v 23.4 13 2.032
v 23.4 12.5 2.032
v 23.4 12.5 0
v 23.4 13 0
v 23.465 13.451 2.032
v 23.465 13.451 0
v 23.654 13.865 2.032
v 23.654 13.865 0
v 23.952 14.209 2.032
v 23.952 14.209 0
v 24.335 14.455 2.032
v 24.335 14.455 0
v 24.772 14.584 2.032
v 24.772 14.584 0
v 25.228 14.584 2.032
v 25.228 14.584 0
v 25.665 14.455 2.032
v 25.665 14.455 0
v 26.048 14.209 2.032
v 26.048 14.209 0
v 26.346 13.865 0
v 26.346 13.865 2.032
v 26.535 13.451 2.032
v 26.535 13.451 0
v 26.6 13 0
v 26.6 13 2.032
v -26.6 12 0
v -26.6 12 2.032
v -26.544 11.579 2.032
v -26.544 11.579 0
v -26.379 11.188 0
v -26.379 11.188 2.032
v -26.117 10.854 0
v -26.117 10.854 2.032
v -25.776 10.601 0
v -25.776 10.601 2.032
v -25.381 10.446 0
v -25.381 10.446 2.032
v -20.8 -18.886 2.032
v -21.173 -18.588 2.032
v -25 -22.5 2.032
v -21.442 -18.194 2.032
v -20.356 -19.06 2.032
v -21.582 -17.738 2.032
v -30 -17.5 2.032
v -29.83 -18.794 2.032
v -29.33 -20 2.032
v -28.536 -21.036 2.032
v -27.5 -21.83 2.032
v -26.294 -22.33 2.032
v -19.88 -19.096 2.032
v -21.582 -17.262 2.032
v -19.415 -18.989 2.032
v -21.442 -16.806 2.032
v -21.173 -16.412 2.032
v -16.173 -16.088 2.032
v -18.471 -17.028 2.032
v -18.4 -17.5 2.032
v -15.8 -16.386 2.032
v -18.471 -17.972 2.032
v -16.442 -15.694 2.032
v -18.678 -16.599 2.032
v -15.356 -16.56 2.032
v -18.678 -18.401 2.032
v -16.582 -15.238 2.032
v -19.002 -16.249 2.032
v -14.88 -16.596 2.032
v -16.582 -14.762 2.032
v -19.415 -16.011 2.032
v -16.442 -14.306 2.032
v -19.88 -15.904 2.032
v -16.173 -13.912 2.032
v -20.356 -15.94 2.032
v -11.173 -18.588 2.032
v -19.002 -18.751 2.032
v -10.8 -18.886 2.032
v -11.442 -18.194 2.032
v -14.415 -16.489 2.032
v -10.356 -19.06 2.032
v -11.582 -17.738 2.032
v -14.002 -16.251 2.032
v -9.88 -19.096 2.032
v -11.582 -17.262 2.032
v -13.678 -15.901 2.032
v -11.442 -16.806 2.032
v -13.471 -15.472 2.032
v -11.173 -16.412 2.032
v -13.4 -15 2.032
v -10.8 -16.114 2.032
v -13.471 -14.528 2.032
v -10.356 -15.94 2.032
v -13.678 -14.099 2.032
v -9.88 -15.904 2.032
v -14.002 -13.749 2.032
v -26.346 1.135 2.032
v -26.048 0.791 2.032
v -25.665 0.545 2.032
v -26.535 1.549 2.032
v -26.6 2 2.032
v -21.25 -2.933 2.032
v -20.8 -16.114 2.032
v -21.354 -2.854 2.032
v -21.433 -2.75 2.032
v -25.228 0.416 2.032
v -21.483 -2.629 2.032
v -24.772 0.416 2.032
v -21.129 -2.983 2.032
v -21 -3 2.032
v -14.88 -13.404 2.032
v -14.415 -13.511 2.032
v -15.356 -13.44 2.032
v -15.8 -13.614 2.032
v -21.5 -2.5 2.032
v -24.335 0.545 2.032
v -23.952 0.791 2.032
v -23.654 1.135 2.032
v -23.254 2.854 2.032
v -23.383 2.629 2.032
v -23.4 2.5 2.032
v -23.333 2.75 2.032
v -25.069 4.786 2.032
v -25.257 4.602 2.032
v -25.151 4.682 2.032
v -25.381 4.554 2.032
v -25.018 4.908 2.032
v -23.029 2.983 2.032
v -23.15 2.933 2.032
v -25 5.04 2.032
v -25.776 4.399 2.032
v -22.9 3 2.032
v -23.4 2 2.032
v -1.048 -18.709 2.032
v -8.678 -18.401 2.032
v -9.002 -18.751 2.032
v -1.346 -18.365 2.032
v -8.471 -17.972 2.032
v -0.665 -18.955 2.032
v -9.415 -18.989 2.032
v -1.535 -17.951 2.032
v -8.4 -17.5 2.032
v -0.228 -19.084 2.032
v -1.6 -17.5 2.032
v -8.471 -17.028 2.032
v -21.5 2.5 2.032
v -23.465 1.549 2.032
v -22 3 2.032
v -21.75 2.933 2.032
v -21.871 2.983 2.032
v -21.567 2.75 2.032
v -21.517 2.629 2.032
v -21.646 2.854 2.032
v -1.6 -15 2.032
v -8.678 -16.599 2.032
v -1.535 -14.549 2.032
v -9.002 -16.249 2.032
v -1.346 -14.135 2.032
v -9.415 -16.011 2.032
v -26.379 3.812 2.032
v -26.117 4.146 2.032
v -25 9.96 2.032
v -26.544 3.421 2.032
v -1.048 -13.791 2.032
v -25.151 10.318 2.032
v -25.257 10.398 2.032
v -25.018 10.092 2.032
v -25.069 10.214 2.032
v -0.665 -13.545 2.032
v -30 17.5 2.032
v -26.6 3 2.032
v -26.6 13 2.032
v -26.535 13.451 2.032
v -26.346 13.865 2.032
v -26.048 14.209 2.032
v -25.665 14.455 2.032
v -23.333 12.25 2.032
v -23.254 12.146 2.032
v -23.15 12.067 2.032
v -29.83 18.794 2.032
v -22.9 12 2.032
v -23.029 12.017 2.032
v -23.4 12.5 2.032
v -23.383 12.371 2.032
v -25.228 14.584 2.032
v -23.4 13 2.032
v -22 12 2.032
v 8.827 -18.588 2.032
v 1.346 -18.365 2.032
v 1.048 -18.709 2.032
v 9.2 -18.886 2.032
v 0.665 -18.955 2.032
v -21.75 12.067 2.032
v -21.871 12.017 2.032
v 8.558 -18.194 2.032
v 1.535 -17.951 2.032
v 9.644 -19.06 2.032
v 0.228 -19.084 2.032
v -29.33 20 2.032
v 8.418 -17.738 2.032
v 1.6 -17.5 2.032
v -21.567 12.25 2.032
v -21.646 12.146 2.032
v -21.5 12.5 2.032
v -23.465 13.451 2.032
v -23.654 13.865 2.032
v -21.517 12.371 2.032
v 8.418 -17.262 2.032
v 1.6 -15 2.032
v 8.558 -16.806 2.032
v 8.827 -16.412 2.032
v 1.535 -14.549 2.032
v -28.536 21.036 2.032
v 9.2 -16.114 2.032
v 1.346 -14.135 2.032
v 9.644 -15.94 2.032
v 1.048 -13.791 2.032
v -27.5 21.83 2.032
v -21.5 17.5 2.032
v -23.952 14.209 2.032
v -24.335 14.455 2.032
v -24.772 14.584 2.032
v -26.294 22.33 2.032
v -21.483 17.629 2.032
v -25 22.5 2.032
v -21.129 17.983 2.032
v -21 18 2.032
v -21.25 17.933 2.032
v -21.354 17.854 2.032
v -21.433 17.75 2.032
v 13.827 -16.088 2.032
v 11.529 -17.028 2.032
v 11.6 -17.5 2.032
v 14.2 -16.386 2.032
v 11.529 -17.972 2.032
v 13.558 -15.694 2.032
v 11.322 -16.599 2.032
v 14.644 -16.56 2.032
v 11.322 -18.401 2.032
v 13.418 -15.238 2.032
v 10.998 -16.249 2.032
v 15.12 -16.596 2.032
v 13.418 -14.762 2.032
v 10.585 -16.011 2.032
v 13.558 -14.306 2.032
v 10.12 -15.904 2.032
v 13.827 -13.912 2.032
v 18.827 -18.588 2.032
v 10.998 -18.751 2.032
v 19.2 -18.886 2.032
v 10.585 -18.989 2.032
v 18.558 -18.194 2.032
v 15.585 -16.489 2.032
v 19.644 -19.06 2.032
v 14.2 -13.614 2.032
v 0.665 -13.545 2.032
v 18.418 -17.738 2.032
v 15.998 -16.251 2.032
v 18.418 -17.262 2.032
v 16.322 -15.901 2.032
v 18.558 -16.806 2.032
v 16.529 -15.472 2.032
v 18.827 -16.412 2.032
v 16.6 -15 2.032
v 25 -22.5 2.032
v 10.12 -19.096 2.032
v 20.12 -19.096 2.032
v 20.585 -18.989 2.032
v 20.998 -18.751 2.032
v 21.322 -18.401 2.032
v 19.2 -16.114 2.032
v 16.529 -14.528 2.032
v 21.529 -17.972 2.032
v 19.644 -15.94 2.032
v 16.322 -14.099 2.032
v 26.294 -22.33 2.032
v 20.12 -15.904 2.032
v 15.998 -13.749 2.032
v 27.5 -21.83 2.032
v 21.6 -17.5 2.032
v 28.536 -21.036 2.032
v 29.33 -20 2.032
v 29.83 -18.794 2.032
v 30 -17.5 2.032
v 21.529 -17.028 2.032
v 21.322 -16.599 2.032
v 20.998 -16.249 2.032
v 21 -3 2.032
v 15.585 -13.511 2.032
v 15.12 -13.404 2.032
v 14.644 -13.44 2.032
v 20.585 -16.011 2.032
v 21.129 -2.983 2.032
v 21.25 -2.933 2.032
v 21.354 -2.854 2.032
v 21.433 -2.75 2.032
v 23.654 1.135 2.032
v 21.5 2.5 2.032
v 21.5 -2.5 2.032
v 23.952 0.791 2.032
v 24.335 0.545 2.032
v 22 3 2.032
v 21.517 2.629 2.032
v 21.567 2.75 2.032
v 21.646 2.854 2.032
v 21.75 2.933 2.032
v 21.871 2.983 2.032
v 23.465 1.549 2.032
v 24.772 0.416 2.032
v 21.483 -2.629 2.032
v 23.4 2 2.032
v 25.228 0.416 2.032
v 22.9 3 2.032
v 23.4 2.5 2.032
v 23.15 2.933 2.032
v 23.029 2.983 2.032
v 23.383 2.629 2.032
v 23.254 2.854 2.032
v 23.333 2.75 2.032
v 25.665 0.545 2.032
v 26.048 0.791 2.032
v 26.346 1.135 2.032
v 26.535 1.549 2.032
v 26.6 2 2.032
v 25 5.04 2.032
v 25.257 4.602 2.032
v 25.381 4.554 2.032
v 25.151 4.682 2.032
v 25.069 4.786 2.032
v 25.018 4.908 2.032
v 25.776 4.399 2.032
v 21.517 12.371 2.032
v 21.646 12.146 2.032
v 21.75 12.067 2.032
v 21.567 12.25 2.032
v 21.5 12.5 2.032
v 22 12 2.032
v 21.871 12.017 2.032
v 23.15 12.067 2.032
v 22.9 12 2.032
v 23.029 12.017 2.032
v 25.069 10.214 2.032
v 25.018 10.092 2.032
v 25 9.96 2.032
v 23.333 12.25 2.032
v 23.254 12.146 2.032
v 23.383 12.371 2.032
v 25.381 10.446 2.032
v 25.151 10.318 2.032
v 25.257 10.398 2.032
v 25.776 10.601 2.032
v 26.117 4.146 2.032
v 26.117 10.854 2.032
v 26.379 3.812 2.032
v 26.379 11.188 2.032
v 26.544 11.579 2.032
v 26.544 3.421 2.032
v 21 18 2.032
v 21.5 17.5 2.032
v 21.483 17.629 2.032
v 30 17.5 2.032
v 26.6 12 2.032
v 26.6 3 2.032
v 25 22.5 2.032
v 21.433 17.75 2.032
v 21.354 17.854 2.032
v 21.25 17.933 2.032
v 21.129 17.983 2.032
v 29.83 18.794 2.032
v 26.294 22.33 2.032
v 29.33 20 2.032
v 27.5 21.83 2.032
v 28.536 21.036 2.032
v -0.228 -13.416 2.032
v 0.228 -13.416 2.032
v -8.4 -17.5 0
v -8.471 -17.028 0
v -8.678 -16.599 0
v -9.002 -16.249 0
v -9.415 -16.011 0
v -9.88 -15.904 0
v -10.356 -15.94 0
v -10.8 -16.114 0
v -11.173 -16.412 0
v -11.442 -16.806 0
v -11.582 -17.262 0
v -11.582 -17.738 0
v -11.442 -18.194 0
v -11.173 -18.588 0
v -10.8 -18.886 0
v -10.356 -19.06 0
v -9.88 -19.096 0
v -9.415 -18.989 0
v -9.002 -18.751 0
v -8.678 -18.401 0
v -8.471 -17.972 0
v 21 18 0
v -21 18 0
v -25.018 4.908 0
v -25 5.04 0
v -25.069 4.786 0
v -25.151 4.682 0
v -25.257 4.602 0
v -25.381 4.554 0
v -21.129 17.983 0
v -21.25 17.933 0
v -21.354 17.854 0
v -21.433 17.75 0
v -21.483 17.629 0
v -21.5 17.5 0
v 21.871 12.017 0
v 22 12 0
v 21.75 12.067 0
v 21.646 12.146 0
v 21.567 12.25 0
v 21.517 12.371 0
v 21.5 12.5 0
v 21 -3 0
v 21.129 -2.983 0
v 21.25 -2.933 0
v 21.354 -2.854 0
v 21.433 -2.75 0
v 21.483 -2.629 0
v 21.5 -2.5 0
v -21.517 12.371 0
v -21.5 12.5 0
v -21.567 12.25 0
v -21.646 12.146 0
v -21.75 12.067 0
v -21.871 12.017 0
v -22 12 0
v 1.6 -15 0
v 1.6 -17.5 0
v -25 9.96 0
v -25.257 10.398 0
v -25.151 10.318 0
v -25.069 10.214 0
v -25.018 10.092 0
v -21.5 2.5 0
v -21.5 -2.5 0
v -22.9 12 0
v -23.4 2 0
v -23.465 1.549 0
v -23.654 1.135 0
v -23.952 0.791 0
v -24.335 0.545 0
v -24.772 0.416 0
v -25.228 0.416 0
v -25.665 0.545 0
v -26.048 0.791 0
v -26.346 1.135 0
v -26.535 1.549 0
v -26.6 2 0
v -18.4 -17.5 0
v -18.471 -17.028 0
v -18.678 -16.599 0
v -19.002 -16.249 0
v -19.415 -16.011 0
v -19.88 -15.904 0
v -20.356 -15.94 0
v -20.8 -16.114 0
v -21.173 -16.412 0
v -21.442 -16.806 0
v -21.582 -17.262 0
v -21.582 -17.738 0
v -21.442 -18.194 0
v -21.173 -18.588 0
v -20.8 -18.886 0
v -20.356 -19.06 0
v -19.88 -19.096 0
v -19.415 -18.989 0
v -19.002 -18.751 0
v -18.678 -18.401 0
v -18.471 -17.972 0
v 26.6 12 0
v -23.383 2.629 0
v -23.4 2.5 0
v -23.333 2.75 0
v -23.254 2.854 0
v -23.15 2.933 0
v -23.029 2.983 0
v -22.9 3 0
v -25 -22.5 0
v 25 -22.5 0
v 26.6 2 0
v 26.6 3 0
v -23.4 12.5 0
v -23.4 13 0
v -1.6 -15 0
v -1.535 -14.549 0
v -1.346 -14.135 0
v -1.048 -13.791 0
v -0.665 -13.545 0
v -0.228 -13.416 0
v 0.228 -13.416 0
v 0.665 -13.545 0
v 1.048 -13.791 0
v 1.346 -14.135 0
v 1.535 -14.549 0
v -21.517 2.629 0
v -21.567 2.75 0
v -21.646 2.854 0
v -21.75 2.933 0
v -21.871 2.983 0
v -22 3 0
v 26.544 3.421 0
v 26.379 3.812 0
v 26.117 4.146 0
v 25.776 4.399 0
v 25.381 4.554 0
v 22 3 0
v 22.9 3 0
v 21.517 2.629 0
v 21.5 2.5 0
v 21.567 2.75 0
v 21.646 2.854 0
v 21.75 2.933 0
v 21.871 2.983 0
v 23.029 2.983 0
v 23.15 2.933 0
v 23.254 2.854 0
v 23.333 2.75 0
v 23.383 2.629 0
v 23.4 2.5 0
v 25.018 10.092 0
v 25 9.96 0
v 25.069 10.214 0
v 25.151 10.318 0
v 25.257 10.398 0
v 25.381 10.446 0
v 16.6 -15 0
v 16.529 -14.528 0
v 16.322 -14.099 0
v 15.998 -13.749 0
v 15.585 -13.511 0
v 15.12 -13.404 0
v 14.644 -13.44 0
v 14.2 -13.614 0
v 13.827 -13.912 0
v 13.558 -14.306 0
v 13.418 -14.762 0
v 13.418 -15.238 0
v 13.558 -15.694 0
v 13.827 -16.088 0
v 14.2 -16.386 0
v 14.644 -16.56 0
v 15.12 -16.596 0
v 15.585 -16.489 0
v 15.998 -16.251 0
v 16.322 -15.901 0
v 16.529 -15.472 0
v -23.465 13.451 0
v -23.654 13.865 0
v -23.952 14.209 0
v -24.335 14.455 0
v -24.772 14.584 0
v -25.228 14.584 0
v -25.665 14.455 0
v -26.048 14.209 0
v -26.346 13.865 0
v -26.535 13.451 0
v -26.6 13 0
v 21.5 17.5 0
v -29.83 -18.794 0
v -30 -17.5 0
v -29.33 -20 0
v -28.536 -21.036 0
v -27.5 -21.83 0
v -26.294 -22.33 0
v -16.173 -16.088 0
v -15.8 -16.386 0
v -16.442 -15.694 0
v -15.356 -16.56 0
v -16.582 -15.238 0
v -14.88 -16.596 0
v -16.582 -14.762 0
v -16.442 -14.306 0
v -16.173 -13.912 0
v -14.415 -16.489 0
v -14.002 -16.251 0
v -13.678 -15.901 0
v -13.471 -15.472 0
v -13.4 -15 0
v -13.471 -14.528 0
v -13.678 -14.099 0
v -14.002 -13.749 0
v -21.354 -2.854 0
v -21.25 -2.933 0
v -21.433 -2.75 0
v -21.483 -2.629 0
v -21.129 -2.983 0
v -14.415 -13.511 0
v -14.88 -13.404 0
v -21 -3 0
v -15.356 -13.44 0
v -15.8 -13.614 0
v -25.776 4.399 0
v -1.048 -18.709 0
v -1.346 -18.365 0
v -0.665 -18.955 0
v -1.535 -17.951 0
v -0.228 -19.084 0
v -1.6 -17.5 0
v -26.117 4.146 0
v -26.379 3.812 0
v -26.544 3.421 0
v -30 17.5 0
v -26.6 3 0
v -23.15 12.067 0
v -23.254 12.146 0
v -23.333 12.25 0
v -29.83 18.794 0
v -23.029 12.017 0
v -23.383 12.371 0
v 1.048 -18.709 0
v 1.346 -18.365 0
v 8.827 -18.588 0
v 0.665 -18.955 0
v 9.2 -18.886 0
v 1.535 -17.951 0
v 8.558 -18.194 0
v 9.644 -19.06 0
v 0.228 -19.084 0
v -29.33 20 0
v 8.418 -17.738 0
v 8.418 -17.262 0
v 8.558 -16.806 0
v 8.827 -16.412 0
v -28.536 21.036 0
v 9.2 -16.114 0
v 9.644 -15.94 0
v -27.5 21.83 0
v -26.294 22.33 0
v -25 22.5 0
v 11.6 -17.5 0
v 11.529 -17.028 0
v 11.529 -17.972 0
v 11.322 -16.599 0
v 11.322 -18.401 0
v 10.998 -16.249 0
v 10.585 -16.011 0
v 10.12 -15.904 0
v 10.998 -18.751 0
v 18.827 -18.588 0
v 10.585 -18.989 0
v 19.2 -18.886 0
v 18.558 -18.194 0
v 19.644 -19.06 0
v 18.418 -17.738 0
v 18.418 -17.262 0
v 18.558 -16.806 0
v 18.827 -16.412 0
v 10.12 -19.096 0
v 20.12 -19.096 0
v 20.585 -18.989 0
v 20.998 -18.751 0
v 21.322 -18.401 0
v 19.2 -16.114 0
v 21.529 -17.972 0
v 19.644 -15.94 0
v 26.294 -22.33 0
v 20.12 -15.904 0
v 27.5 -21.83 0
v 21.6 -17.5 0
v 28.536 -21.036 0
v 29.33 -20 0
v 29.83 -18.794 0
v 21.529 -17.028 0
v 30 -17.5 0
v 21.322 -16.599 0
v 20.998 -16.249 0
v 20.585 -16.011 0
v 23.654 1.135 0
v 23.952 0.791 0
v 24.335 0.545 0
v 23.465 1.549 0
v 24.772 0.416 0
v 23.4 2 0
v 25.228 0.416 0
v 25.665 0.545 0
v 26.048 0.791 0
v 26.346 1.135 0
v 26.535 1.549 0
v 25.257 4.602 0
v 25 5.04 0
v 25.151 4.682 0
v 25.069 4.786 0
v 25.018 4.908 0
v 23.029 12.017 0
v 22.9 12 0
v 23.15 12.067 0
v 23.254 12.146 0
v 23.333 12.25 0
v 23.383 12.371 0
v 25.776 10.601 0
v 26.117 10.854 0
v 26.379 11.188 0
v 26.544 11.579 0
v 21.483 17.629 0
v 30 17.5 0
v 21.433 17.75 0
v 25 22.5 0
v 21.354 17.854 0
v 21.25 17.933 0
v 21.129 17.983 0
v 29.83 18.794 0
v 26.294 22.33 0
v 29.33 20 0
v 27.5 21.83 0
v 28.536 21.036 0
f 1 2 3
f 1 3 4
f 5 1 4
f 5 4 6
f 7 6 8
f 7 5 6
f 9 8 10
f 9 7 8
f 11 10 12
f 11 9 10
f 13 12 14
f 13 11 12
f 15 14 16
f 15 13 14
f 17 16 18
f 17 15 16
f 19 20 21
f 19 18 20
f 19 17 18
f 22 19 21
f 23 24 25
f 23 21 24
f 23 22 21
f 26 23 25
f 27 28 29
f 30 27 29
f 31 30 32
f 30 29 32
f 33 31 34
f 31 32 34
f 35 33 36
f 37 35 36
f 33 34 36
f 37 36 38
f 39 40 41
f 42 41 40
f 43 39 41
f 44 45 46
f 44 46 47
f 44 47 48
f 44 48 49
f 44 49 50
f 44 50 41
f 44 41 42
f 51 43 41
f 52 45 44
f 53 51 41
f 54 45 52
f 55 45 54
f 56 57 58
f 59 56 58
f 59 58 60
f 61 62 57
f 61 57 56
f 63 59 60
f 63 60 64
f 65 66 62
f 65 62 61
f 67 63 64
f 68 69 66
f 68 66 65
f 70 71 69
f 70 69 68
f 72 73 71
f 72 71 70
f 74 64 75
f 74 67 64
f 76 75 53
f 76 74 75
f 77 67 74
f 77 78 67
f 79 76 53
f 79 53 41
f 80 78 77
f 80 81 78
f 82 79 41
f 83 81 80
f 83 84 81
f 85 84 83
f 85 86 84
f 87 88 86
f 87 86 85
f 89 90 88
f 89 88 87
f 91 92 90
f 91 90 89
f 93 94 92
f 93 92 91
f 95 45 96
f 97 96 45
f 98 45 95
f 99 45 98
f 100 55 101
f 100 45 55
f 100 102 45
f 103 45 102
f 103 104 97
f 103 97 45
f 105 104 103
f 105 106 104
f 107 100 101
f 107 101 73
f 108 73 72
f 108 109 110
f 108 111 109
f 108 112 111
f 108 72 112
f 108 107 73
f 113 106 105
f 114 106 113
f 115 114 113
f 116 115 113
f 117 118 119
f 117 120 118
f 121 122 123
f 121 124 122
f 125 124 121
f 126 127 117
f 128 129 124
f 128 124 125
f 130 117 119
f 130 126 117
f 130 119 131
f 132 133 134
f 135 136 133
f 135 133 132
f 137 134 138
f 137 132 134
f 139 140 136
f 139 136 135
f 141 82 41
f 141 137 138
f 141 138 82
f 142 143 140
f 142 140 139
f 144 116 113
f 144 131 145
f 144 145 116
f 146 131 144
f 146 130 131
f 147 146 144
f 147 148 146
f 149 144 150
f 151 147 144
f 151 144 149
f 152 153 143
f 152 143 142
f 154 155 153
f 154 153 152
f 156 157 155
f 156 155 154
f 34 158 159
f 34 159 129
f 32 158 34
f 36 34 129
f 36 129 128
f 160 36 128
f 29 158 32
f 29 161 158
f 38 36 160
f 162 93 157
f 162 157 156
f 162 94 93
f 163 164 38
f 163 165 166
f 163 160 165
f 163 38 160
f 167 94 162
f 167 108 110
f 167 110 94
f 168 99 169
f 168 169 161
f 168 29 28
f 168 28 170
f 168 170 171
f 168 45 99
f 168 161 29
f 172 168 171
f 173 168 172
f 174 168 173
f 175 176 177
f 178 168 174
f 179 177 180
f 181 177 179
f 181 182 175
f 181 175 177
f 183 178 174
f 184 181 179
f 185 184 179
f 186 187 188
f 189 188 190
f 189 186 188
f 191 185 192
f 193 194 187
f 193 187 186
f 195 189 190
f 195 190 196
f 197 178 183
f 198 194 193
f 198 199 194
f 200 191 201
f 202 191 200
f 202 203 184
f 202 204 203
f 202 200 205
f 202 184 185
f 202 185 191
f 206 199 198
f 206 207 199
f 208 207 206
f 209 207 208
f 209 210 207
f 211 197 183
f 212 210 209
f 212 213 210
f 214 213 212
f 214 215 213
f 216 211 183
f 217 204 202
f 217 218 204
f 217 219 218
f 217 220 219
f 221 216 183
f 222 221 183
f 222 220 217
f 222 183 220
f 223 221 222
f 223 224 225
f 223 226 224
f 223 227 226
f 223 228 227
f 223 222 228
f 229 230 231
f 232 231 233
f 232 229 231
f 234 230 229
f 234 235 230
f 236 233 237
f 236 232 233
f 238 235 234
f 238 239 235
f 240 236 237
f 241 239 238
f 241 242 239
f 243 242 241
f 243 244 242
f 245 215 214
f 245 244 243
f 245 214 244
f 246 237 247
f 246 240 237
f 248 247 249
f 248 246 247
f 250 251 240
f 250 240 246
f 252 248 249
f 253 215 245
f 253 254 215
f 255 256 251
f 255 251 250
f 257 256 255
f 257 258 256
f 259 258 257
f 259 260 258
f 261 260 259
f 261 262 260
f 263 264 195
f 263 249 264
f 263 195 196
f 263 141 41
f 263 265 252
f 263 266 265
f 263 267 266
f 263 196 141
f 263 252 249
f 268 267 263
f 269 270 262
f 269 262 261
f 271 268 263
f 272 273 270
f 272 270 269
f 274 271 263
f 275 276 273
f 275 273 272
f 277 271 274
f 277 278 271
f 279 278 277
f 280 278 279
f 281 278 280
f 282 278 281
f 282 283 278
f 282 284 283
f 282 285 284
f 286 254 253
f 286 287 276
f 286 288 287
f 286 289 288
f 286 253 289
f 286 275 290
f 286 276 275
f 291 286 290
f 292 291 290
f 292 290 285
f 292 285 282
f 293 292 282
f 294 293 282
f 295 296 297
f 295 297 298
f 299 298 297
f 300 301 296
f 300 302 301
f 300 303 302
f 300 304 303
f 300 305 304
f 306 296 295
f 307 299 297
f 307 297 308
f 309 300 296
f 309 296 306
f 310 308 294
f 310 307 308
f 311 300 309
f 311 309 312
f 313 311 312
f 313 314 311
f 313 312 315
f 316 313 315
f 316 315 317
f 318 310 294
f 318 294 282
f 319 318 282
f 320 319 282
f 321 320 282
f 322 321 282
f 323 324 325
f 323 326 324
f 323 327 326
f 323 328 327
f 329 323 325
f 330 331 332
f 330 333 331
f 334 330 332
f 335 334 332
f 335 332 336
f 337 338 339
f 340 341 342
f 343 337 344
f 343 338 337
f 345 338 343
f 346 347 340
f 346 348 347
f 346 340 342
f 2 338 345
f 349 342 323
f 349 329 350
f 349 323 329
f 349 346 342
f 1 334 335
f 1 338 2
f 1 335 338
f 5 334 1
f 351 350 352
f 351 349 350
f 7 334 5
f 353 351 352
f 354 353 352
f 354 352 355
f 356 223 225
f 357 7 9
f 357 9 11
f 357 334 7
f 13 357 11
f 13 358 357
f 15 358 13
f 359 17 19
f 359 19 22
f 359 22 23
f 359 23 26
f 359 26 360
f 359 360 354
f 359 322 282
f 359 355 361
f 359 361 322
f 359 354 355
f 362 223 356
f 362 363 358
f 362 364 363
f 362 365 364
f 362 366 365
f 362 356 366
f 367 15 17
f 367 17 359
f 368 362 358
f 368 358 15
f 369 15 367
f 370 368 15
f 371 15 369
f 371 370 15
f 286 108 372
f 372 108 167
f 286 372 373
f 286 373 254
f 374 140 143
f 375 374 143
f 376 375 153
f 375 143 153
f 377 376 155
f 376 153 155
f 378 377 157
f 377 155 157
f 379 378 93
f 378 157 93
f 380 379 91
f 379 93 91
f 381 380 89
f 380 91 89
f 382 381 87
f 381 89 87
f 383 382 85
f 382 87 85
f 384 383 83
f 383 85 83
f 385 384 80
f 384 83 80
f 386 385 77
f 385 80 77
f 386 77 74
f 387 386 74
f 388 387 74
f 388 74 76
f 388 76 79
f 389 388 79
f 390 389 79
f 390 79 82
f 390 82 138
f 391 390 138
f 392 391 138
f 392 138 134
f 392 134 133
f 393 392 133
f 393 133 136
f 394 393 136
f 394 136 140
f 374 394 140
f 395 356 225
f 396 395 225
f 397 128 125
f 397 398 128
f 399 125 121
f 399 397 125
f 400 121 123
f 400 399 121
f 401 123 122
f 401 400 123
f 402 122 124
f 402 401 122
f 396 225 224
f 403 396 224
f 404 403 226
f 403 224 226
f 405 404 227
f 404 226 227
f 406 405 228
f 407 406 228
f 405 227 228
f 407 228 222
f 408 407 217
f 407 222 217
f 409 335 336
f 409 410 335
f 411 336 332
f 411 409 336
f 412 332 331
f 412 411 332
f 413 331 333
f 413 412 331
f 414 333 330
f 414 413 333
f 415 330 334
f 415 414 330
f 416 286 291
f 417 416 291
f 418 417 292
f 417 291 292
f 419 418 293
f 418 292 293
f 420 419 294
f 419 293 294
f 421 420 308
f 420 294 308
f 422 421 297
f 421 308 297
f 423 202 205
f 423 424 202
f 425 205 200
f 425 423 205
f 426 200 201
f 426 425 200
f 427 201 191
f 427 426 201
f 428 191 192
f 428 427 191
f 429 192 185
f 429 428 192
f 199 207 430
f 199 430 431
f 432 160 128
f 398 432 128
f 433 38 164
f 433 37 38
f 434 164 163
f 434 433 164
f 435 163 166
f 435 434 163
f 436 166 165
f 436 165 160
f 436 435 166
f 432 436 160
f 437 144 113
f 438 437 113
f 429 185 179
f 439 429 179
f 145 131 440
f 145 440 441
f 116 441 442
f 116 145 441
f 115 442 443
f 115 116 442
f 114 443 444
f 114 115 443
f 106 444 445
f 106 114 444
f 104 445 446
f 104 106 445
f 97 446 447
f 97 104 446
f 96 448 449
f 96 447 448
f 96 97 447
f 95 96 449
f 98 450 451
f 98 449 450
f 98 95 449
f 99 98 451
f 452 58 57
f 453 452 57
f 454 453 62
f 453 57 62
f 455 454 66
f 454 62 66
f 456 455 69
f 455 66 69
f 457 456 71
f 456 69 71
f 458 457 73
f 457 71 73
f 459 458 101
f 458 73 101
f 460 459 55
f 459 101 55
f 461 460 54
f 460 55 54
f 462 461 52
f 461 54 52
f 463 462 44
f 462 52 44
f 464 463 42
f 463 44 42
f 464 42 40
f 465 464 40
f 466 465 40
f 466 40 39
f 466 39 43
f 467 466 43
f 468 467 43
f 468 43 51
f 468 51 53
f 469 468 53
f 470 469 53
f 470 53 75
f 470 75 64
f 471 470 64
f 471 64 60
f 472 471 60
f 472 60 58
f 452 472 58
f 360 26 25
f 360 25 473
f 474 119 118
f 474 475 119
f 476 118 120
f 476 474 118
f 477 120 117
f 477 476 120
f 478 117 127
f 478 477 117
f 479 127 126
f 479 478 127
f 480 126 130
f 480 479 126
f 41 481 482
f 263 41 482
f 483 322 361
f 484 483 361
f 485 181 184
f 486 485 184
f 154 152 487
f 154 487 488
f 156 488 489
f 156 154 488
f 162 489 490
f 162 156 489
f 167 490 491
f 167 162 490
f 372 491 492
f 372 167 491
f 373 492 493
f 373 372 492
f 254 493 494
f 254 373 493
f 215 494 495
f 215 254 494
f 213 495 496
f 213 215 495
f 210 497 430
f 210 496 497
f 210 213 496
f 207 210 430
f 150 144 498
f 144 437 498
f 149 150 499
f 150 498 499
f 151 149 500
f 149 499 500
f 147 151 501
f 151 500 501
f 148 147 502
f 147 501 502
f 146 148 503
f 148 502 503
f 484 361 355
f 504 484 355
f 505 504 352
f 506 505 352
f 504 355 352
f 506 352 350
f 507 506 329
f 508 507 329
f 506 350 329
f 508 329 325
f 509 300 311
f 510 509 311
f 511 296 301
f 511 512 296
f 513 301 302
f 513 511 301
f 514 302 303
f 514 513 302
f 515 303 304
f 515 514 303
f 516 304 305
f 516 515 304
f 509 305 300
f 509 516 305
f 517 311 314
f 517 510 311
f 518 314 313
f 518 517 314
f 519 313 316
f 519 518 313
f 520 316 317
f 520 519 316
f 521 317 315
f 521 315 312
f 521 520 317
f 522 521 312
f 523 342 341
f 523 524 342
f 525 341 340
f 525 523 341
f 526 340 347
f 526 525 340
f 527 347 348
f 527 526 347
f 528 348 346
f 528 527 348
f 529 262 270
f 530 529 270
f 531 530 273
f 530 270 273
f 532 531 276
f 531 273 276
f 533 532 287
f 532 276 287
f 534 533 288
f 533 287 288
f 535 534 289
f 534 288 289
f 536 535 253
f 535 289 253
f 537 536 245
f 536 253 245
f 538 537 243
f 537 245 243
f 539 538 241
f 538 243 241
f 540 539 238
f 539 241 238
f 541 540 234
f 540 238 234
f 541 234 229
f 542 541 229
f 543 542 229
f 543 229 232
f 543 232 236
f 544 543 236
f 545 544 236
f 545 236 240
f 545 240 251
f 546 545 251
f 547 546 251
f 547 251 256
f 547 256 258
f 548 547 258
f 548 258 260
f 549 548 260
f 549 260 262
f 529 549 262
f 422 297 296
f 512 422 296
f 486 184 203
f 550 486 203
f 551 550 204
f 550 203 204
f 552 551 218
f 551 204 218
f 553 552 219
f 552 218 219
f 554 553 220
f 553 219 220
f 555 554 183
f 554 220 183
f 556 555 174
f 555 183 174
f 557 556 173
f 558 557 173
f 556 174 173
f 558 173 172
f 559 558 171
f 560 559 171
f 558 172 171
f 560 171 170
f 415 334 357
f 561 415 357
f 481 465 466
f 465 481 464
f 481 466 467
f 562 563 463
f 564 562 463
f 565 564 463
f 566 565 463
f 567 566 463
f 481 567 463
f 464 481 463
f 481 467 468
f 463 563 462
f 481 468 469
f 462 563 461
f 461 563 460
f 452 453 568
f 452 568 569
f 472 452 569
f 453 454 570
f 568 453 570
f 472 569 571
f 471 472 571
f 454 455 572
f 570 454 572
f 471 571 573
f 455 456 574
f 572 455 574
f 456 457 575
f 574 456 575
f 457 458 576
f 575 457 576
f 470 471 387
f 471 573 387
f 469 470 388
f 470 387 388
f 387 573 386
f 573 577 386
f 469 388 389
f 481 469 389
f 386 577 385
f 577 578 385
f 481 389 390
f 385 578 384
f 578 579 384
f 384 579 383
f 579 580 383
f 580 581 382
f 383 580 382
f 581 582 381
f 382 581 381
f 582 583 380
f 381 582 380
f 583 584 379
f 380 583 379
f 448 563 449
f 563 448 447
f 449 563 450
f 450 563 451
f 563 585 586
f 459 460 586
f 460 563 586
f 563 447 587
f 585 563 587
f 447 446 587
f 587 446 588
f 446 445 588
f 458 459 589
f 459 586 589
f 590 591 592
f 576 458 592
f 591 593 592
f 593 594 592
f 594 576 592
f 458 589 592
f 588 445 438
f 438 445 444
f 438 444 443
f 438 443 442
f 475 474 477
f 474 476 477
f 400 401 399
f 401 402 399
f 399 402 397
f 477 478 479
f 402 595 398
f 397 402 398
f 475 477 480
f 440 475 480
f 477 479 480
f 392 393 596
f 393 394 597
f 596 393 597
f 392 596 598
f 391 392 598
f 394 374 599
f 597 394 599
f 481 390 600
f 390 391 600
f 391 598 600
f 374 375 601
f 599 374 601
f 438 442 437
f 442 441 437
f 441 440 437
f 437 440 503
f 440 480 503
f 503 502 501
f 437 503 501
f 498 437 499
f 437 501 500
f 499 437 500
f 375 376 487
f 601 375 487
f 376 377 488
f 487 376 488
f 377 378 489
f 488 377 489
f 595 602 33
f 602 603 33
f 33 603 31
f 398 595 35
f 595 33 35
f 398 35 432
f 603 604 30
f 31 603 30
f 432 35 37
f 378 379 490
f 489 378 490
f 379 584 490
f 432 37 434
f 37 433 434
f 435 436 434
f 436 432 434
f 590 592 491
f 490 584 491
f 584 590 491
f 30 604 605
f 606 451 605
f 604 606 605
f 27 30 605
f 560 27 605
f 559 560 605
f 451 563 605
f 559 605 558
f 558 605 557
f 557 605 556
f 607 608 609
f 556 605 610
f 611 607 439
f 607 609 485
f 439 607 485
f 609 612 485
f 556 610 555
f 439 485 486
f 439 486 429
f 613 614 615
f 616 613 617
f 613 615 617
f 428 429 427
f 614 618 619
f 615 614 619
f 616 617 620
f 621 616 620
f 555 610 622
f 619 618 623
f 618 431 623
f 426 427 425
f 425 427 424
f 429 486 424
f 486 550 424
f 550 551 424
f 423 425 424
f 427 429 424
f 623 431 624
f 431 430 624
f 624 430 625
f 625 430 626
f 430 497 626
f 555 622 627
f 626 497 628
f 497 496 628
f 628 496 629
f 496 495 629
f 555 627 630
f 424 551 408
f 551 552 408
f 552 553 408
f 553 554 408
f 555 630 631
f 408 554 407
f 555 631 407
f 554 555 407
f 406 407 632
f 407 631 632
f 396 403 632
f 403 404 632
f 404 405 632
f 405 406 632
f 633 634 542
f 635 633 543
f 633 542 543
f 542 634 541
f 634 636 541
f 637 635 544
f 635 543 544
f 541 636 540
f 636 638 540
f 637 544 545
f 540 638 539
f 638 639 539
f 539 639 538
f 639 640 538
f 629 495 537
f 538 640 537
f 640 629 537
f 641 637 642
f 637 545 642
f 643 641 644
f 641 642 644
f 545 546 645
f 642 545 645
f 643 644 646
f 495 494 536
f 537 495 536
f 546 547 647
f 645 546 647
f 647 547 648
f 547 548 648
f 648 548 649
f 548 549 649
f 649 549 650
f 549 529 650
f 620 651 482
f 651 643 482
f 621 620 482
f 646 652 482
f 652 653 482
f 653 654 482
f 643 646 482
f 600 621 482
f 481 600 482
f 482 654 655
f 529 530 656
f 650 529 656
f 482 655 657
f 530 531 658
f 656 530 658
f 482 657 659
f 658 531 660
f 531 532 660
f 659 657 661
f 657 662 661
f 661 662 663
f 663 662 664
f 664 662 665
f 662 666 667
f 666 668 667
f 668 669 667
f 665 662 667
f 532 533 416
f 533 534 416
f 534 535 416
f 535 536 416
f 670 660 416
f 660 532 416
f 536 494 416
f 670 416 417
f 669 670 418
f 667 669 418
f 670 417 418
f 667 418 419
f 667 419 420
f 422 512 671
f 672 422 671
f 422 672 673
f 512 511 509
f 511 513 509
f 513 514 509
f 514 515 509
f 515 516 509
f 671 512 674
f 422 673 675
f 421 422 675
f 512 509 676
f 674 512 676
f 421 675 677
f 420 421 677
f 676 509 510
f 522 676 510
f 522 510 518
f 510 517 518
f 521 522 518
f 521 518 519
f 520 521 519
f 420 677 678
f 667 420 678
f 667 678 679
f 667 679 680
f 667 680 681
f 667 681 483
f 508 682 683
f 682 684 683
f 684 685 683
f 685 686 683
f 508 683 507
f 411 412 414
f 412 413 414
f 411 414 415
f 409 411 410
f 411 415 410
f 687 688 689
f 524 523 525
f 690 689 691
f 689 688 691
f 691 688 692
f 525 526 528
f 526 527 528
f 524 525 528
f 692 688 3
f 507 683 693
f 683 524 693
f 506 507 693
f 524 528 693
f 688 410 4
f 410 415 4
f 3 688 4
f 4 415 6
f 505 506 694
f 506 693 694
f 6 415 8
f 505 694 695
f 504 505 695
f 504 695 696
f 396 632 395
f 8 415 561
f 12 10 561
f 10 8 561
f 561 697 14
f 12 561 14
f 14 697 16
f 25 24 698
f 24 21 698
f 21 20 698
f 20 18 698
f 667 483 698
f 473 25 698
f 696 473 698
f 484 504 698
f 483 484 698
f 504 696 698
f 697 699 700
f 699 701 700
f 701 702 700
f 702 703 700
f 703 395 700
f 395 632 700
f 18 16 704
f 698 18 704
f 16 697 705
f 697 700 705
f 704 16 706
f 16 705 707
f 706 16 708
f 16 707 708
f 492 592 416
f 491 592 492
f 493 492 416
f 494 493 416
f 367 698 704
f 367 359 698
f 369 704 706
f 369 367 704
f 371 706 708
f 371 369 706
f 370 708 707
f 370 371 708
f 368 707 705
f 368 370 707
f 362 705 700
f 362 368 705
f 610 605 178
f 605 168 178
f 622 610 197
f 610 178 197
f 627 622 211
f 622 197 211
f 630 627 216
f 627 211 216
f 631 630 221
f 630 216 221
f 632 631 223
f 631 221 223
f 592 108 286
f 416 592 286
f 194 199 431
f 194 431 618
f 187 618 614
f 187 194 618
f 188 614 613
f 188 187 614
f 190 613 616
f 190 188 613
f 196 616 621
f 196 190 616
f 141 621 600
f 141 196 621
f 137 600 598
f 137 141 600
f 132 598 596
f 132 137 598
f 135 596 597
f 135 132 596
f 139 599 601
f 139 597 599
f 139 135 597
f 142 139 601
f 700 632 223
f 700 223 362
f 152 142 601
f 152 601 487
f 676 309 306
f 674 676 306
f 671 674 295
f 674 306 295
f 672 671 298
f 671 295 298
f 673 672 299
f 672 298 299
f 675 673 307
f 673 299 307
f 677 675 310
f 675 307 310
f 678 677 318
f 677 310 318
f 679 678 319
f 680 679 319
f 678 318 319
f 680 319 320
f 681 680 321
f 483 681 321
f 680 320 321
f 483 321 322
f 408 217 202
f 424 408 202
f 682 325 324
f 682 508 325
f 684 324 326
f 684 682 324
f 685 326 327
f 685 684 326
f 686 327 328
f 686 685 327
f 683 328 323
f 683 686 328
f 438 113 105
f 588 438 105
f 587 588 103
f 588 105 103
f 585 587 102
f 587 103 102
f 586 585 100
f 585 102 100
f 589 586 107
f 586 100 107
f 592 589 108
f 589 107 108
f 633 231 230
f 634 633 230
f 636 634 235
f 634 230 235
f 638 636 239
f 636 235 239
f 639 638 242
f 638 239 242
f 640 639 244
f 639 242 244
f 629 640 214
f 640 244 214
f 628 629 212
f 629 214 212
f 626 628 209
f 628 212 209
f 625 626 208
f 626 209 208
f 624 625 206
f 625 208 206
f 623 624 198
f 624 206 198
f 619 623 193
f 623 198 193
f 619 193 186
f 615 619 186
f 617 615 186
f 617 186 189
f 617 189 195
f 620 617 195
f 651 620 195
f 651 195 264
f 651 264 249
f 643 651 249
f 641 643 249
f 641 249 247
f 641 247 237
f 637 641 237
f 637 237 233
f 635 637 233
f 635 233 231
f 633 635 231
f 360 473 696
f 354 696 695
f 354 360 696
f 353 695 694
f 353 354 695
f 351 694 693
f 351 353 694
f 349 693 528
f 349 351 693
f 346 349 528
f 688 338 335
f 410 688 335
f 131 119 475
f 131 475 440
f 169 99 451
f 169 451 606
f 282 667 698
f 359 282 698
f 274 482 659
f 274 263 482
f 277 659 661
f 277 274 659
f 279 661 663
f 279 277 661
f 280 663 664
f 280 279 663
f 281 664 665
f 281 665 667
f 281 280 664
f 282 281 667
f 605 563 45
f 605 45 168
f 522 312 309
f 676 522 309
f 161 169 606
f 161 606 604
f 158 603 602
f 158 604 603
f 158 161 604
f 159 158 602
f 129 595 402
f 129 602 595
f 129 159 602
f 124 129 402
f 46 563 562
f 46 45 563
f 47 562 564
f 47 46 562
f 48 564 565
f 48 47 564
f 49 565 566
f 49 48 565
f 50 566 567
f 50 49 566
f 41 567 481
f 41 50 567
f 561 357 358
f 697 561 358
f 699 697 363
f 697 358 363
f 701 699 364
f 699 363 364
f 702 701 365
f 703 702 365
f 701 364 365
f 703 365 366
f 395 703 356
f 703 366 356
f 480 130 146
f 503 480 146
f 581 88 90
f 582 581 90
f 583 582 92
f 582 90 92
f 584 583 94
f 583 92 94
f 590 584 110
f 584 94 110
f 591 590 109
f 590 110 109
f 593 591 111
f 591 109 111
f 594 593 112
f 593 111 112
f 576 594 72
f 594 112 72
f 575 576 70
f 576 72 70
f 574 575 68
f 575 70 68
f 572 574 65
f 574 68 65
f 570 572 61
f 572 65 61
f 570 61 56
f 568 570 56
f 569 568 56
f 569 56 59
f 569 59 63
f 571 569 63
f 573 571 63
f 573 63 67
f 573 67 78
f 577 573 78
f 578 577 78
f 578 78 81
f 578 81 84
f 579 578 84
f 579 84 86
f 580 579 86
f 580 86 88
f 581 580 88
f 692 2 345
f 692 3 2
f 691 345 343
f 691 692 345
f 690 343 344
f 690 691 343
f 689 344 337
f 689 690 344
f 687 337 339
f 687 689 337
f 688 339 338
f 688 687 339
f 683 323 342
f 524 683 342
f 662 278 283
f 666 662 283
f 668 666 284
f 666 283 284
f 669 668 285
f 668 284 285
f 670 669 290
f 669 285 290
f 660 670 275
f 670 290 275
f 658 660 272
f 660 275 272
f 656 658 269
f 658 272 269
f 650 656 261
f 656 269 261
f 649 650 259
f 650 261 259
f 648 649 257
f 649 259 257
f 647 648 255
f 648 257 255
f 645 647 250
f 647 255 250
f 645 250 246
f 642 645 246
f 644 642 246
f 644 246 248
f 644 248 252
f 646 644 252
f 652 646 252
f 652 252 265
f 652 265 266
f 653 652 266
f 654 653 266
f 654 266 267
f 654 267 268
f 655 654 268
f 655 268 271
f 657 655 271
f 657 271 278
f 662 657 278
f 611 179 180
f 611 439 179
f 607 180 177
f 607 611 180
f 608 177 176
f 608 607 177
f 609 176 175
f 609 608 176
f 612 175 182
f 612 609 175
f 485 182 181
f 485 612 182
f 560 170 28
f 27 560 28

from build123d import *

# Parameters (mm, degrees)
SKETCH1_W           = 60
SKETCH1_H           = 45
BOSS_EXTRUDE1_DEPTH = 2.032
FILLET1_R           = 5
SKETCH2_W           = 41
SKETCH2_H           = 21
CUT_EXTRUDE1_DEPTH  = 3.032
FILLET2_R           = 0.5
CUT_EXTRUDE2_DEPTH  = 3.032
SKETCH4_R           = 1.6
CUT_EXTRUDE3_DEPTH  = 3.032
CUT_EXTRUDE4_DEPTH  = 3.032
FILLET3_R           = 0.5


with BuildPart() as part:
    # Sketch1 → Boss-Extrude1 (new body)
    with BuildSketch(Plane.XY):
        Rectangle(SKETCH1_W, SKETCH1_H)
    extrude(amount=BOSS_EXTRUDE1_DEPTH)

    # Fillet1
    fillet1_edges = [part.edges().sort_by_distance(p)[0] for p in [
        (30, -22.5, 1.016),
        (-30, -22.5, 1.016),
        (-30, 22.5, 1.016),
        (30, 22.5, 1.016),
    ]]
    fillet(fillet1_edges, radius=FILLET1_R)

    # Sketch2 → Cut-Extrude1 (cut, through all)
    with BuildSketch(Plane.XY.offset(2.032)):
        with Locations((0, 7.5)):
            Rectangle(SKETCH2_W, SKETCH2_H)
    extrude(amount=-CUT_EXTRUDE1_DEPTH, mode=Mode.SUBTRACT)

    # Fillet2
    fillet2_edges = [part.edges().sort_by_distance(p)[0] for p in [
        (20.5, 18, 1.016),
        (20.5, -3, 1.016),
        (-20.5, -3, 1.016),
        (-20.5, 18, 1.016),
    ]]
    fillet(fillet2_edges, radius=FILLET2_R)

    # Sketch3 → Cut-Extrude2 (cut, through all)
    with BuildSketch(Plane.XY.offset(2.032)):
        with BuildLine():
            Line((-23.4, 3), (-23.4, 2))
            ThreePointArc((-23.4, 2), (-25, 0.4), (-26.6, 2))
            Line((-26.6, 2), (-26.6, 3))
            ThreePointArc((-26.6, 3), (-25, 4.6), (-23.4, 3))
        make_face()
        with BuildLine():
            Line((-23.4, 12), (-23.4, 13))
            ThreePointArc((-23.4, 13), (-25, 14.6), (-26.6, 13))
            Line((-26.6, 13), (-26.6, 12))
            ThreePointArc((-26.6, 12), (-25, 10.4), (-23.4, 12))
        make_face()
        with BuildLine():
            Line((23.4, 3), (23.4, 2))
            ThreePointArc((23.4, 2), (25, 0.4), (26.6, 2))
            Line((26.6, 2), (26.6, 3))
            ThreePointArc((26.6, 3), (25, 4.6), (23.4, 3))
        make_face()
        with BuildLine():
            Line((23.4, 12), (23.4, 13))
            ThreePointArc((23.4, 13), (25, 14.6), (26.6, 13))
            Line((26.6, 13), (26.6, 12))
            ThreePointArc((26.6, 12), (25, 10.4), (23.4, 12))
        make_face()
    extrude(amount=-CUT_EXTRUDE2_DEPTH, mode=Mode.SUBTRACT)

    # Sketch4 → Cut-Extrude3 (cut, through all)
    with BuildSketch(Plane.XY.offset(2.032)):
        with Locations((-15, -15)):
            Circle(SKETCH4_R)
        with Locations((15, -15)):
            Circle(SKETCH4_R)
        with Locations((10, -17.5)):
            Circle(SKETCH4_R)
        with Locations((-10, -17.5)):
            Circle(SKETCH4_R)
        with Locations((20, -17.5)):
            Circle(SKETCH4_R)
        with Locations((-20, -17.5)):
            Circle(SKETCH4_R)
        with BuildLine():
            Line((1.6, -15), (1.6, -17.5))
            ThreePointArc((1.6, -17.5), (0, -19.1), (-1.6, -17.5))
            Line((-1.6, -17.5), (-1.6, -15))
            ThreePointArc((-1.6, -15), (0, -13.4), (1.6, -15))
        make_face()
    extrude(amount=-CUT_EXTRUDE3_DEPTH, mode=Mode.SUBTRACT)

    # Sketch5 → Cut-Extrude4 (cut, through all)
    with BuildSketch(Plane.XY.offset(2.032)):
        with BuildLine():
            Line((-21, -3), (21, -3))
            ThreePointArc((21, -3), (21.353553391, -2.853553391), (21.5, -2.5))
            Line((21.5, -2.5), (21.5, 3))
            Line((21.5, 3), (23.4, 3))
            ThreePointArc((23.4, 3), (24.53137085, 3.46862915), (25, 4.6))
            Line((25, 4.6), (25, 10.4))
            ThreePointArc((25, 10.4), (24.53137085, 11.53137085), (23.4, 12))
            Line((23.4, 12), (21.5, 12))
            Line((21.5, 12), (21.5, 17.5))
            ThreePointArc((21.5, 17.5), (21.353553391, 17.853553391), (21, 18))
            Line((21, 18), (-21, 18))
            ThreePointArc((-21, 18), (-21.353553391, 17.853553391), (-21.5, 17.5))
            Line((-21.5, 17.5), (-21.5, 12))
            Line((-21.5, 12), (-23.4, 12))
            ThreePointArc((-23.4, 12), (-24.53137085, 11.53137085), (-25, 10.4))
            Line((-25, 10.4), (-25, 4.6))
            ThreePointArc((-25, 4.6), (-24.53137085, 3.46862915), (-23.4, 3))
            Line((-23.4, 3), (-21.5, 3))
            Line((-21.5, 3), (-21.5, -2.5))
            ThreePointArc((-21.5, -2.5), (-21.353553391, -2.853553391), (-21, -3))
        make_face()
    extrude(amount=-CUT_EXTRUDE4_DEPTH, mode=Mode.SUBTRACT)

    # Fillet3
    fillet3_edges = [part.edges().sort_by_distance(p)[0] for p in [
        (23.4, 3, 1.016),
        (23.4, 12, 1.016),
        (-21.5, 3, 1.016),
        (-25, 4.6, 1.016),
        (-25, 10.4, 1.016),
        (-21.5, 12, 1.016),
        (21.5, 12, 1.016),
        (25, 10.4, 1.016),
        (25, 4.6, 1.016),
        (21.5, 3, 1.016),
        (-23.4, 3, 1.016),
        (-23.4, 12, 1.016),
    ]]
    fillet(fillet3_edges, radius=FILLET3_R)


solid = part.part
